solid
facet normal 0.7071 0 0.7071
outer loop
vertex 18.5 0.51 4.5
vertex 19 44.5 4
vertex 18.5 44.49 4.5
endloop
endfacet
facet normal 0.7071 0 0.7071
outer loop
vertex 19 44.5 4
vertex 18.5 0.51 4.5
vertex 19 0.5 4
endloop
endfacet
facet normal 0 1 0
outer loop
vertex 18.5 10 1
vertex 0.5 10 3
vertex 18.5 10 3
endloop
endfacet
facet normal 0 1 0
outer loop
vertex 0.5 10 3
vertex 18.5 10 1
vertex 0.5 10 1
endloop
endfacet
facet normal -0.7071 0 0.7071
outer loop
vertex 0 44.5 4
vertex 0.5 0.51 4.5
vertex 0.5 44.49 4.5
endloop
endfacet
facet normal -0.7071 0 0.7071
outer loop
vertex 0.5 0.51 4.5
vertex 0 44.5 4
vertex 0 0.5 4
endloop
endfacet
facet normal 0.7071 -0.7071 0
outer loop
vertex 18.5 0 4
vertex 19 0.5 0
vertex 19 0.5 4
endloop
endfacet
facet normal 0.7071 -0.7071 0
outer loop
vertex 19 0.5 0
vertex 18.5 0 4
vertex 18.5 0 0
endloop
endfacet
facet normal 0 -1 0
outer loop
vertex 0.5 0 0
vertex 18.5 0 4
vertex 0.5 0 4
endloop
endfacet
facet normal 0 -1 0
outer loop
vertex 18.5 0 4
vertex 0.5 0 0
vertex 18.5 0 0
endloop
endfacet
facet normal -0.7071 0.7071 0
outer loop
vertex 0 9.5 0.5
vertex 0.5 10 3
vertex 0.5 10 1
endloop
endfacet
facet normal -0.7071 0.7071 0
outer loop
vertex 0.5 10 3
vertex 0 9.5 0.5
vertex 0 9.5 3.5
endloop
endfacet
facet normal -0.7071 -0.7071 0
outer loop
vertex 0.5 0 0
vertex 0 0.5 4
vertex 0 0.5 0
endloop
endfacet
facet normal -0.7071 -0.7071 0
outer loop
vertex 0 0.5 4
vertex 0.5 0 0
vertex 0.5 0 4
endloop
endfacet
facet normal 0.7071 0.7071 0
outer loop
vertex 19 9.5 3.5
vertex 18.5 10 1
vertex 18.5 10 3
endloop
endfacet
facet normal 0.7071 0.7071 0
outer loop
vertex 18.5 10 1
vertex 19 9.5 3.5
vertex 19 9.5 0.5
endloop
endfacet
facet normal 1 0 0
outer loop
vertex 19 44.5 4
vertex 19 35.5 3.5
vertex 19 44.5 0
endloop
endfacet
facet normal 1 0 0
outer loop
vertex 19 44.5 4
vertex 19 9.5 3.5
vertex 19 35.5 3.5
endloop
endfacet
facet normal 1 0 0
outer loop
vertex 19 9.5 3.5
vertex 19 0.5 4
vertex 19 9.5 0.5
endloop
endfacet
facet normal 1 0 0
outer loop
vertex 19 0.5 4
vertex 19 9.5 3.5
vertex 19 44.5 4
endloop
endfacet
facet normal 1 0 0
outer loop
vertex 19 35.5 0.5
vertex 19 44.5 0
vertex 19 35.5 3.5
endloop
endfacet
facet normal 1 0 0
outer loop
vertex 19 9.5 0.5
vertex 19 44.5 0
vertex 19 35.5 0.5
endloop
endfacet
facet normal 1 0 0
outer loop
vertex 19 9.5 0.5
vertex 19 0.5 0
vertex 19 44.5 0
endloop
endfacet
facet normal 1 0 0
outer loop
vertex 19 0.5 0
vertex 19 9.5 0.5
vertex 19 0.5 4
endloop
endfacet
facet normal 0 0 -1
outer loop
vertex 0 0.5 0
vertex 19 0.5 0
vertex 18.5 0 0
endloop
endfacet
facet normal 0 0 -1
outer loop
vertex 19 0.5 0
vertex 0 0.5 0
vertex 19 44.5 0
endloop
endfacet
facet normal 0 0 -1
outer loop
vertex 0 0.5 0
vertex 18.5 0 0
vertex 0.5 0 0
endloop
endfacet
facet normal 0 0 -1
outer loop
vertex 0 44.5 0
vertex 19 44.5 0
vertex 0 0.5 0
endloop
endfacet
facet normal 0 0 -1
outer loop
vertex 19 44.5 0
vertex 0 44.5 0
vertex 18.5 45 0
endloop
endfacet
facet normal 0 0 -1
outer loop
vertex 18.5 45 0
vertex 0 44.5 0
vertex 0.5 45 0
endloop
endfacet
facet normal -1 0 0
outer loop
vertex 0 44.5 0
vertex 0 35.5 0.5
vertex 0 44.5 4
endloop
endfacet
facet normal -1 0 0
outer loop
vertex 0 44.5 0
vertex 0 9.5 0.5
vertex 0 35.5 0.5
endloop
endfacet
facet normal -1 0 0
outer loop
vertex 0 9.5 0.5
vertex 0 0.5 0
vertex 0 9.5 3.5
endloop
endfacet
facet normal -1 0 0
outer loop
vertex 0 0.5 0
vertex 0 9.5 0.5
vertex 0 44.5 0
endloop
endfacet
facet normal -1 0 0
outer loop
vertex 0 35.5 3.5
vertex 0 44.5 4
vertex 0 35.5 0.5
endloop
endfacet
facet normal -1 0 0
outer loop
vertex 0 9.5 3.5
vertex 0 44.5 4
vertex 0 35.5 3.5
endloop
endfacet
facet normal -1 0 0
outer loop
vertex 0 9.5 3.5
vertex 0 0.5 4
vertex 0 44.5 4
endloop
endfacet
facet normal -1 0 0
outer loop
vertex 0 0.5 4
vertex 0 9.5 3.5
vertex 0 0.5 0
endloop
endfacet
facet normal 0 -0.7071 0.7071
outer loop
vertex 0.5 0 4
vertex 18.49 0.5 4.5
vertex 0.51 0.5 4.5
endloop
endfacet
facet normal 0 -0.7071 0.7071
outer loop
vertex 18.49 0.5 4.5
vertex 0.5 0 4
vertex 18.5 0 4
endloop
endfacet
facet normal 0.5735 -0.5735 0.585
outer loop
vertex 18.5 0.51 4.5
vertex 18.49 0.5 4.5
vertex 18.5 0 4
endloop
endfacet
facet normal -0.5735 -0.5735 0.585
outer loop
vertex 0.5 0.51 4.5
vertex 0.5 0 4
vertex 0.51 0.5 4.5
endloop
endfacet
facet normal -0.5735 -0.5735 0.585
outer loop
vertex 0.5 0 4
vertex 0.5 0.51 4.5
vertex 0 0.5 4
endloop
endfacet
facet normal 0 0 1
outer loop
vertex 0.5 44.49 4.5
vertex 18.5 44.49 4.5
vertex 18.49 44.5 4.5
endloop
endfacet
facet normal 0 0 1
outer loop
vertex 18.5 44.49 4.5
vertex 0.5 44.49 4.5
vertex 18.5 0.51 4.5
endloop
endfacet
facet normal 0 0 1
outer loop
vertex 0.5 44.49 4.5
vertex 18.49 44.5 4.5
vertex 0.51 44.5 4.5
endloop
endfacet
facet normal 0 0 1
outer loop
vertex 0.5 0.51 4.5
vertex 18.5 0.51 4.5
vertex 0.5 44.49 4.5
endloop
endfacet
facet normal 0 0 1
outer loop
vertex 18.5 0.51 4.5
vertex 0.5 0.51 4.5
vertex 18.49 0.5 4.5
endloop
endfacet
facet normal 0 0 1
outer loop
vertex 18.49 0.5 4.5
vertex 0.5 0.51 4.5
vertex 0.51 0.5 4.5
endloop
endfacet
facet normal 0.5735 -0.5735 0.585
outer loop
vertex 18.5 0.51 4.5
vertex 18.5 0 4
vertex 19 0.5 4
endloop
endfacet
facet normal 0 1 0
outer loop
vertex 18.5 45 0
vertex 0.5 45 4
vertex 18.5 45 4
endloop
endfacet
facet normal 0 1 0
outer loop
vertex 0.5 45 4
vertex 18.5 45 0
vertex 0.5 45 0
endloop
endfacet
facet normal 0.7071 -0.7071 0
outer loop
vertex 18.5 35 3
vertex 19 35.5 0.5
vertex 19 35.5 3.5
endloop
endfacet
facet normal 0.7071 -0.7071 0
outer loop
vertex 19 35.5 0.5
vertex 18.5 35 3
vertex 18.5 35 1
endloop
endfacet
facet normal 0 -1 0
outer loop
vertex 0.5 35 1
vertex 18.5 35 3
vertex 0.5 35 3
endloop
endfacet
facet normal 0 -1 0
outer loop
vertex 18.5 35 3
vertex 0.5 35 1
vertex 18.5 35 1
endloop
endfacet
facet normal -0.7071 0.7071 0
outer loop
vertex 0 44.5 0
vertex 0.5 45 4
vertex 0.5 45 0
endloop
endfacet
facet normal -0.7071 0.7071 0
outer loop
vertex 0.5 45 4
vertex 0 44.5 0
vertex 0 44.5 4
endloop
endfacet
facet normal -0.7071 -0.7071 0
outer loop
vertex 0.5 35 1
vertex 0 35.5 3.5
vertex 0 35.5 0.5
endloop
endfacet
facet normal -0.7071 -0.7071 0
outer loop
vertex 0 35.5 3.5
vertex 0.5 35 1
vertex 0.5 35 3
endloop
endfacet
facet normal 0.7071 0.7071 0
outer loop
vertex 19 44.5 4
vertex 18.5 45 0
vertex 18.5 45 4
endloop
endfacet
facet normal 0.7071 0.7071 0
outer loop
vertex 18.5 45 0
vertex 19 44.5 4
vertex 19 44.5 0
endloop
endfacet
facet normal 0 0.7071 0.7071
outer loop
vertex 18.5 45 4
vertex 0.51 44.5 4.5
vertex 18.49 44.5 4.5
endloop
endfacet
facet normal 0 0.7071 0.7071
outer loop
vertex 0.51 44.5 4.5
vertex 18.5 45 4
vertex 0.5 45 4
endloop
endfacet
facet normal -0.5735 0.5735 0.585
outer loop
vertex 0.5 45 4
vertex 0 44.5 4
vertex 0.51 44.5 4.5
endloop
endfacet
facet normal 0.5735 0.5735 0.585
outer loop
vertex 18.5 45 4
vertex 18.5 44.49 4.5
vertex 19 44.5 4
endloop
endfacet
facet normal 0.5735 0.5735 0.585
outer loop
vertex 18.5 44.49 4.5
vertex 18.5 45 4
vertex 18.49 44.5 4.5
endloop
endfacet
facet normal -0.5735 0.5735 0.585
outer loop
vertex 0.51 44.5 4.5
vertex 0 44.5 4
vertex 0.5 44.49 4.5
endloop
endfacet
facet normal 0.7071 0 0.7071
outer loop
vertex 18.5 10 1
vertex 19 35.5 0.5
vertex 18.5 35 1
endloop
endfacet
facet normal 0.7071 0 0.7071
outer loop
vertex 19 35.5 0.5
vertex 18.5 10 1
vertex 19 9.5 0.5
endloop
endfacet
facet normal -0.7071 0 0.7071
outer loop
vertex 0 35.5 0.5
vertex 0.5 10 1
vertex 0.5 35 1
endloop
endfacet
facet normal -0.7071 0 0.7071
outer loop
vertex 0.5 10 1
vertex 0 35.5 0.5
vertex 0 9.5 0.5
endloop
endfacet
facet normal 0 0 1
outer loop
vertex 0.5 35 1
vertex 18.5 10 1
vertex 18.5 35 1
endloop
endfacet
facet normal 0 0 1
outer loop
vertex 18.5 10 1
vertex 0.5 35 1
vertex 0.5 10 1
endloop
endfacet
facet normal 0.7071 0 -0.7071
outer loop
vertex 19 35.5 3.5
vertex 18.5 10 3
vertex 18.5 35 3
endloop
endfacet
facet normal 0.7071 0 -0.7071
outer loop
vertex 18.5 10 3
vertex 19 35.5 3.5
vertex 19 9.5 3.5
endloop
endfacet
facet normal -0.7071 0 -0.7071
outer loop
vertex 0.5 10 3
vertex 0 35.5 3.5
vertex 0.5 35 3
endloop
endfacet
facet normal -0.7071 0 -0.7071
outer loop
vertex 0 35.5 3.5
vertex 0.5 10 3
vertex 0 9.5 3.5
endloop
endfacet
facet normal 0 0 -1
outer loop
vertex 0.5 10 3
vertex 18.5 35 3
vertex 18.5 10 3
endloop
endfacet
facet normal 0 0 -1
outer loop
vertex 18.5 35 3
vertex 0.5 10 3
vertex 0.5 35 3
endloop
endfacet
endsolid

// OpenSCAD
// ====================================================================================
// Cargo Strap Guide (Saddle / Spacer Mount)
// Version: v0.08
// Date: 2026-07-30
// Revision History:
//   - v0.01: Initial closed-tunnel design.
//   - v0.02: Revised to an open saddle/spacer design.
//   - v0.03: Complete geometry rewrite using a constructive union of rounded blocks.
//   - v0.04: Transformed design to use 45-degree flat chamfers (bevels) on all edges.
//   - v0.05: Simplified by removing all chamfers/wedges from the groove floor.
//   - v0.06: Placed chamfers on the top-left and top-right of the groove floor (z=1.5).
//   - v0.07: Swapped the chamfers on the groove floor block (the plate underneath the
//            strap) so they are on the bottom side of the block (at z=0) and NOT
//            the top side (at z=1.5). The top side of the groove floor (where the
//            strap directly sits) is now 100% flat with sharp square 90-degree edges,
//            while the bottom side has elegant 45-degree bevels along x=0 and x=19.
//   - v0.08: Added a `closed_version` option to provide a secure tunnel, keeping the
//            strap in place even when loose. Maintains the distinct rounded block aesthetic.
//            Added explicit `strap_thickness` and `strap_thickness_clearance` parameters,
//            enabled `closed_version` by default, and added bottom chamfers to the top bridge
//            so the strap easily slides into the tunnel without snagging.
// ====================================================================================

/* [Design Options] */
// Create a closed loop (tunnel) instead of an open saddle
closed_version = true;

// Thickness of the top bridge in the closed version (default 1.5mm)
bridge_thickness = 1.5;


/* [Strap Dimensions] */
// Width of the cargo strap (standard default is 26mm)
strap_width = 25;

// Thickness of the cargo strap (standard default is 1mm)
strap_thickness = 1.5;

// Side clearance inside the groove (width-wise)
strap_clearance = 0.5;

// Vertical clearance inside the groove (thickness-wise)
strap_thickness_clearance = 0.5;


/* [Guide Block Dimensions] */
// Fixed width of the guide block (matches 19mm tape)
block_width = 19;

// Total height of the shoulder blocks
block_height = 3.0;

// Length of the shoulders on each side of the strap groove (default 10mm)
shoulder_length = 10;


/* [Tape Mount Settings] */
// Enable a shallow tape recess on the bottom face (best if block_width is increased)
enable_tape_recess = false;

// Width of the tape recess (must be smaller than block_width, e.g. 17mm)
tape_recess_width = 17.0;

// Depth of the tape recess
tape_recess_depth = 0.5;


/* [Aesthetics & Chamfer Size] */
// Size of the outer flat chamfer (bevel) for the shoulder and floor edges
chamfer_size = 0.5;


// --- Derived Parameters (Internal Math) ---
// Total depth of the groove (strap thickness + vertical clearance)
groove_depth = strap_thickness + strap_thickness_clearance;

block_length = strap_width + 2 * shoulder_length;
groove_floor_height = block_height - groove_depth;

// Groove width between the shoulders
groove_width = strap_width + strap_clearance;

// Overlap length to ensure a solid manifold merge of the floor block inside the shoulders
overlap = 1.0;
groove_floor_length = groove_width + 2 * overlap;

// Safeguards to prevent geometry breakdown due to extreme chamfer inputs
total_height = closed_version ? block_height + bridge_thickness : block_height;
c_out = min(chamfer_size, min(block_width/2 - 0.2, min(block_length/2 - 0.2, total_height - 0.2)));
c_floor = min(chamfer_size, min(block_width/2 - 0.2, groove_floor_height - 0.2));
c_bridge = min(c_out, bridge_thickness/2 - 0.01);


// Generates a 2D octagon (chamfered rectangle)
module chamfered_rectangle(w, l, c) {
    polygon(points = [
        [c, 0], [w - c, 0],
        [w, c], [w, l - c],
        [w - c, l], [c, l],
        [0, l - c], [0, c]
    ]);
}


// Creates a 3D block with chamfered top edges and vertical corners,
// while keeping the bottom face perfectly flat for maximum tape adhesion.
module flat_bottom_chamfered_cube(size, c) {
    w = size[0];
    l = size[1];
    h = size[2];
    hull() {
        // Base prism (vertical walls with chamfered corners up to h - c)
        linear_extrude(height = h - c)
            chamfered_rectangle(w, l, c);

        // Top cap prism (a smaller rectangle at height h to slope the top edges)
        translate([c, c, h - 0.01])
            linear_extrude(height = 0.01)
            chamfered_rectangle(w - 2 * c, l - 2 * c, 0.01);
    }
}


// Generates a 2D profile with chamfered bottom corners and a flat top (for X-Z plane)
module chamfered_bottom_profile(w, h, c) {
    polygon(points = [
        [c, 0], [w - c, 0],
        [w, c], [w, h],
        [0, h], [0, c]
    ]);
}


// Extrudes the chamfered bottom profile along the Y axis
module groove_floor_block_chamfered(w, l, h, c) {
    translate([0, 0, h])
        rotate([270, 0, 0]) // Rotate to map 2D profile (X,Z) to run along Y
        linear_extrude(height = l)
        chamfered_bottom_profile(w, h, c);
}


// Creates a 3D block with chamfered top and bottom edges (for the closed version bridge)
module bridge_block(w, l, h, c) {
    hull() {
        // Middle body
        translate([0, 0, c])
            linear_extrude(height = max(0.01, h - 2 * c))
            chamfered_rectangle(w, l, c);

        // Top cap prism
        translate([c, c, h - 0.01])
            linear_extrude(height = 0.01)
            chamfered_rectangle(w - 2 * c, l - 2 * c, 0.01);

        // Bottom cap prism
        translate([c, c, 0])
            linear_extrude(height = 0.01)
            chamfered_rectangle(w - 2 * c, l - 2 * c, 0.01);
    }
}


module cargo_strap_saddle() {
    difference() {
        union() {
            // 1. Left Shoulder (Chamfered top-inner and top-outer edges)
            translate([0, 0, 0])
                flat_bottom_chamfered_cube([block_width, shoulder_length, total_height], c_out);

            // 2. Right Shoulder
            translate([0, block_length - shoulder_length, 0])
                flat_bottom_chamfered_cube([block_width, shoulder_length, total_height], c_out);

            // 3. Middle Groove Floor Plate
            // Perfectly flat and square-edged on the top side (z=1.5) where the strap rests,
            // with elegant 45-degree chamfers on the bottom side of the block (z=0).
            translate([0, (block_length - groove_floor_length)/2, 0])
                groove_floor_block_chamfered(block_width, groove_floor_length, groove_floor_height, c_floor);

            // 4. Closed Version Top Bridge
            if (closed_version) {
                translate([0, (block_length - groove_floor_length)/2, block_height])
                    bridge_block(block_width, groove_floor_length, bridge_thickness, c_bridge);
            }
        }

        // 5. Optional Tape Recess on Bottom
        if (enable_tape_recess) {
            rec_x = (block_width - tape_recess_width) / 2;
            translate([rec_x, -1, -0.01])
                cube([tape_recess_width, block_length + 2, tape_recess_depth + 0.01]);
        }
    }
}

// Instantiate the smooth, bottom-chamfered model
cargo_strap_saddle();
